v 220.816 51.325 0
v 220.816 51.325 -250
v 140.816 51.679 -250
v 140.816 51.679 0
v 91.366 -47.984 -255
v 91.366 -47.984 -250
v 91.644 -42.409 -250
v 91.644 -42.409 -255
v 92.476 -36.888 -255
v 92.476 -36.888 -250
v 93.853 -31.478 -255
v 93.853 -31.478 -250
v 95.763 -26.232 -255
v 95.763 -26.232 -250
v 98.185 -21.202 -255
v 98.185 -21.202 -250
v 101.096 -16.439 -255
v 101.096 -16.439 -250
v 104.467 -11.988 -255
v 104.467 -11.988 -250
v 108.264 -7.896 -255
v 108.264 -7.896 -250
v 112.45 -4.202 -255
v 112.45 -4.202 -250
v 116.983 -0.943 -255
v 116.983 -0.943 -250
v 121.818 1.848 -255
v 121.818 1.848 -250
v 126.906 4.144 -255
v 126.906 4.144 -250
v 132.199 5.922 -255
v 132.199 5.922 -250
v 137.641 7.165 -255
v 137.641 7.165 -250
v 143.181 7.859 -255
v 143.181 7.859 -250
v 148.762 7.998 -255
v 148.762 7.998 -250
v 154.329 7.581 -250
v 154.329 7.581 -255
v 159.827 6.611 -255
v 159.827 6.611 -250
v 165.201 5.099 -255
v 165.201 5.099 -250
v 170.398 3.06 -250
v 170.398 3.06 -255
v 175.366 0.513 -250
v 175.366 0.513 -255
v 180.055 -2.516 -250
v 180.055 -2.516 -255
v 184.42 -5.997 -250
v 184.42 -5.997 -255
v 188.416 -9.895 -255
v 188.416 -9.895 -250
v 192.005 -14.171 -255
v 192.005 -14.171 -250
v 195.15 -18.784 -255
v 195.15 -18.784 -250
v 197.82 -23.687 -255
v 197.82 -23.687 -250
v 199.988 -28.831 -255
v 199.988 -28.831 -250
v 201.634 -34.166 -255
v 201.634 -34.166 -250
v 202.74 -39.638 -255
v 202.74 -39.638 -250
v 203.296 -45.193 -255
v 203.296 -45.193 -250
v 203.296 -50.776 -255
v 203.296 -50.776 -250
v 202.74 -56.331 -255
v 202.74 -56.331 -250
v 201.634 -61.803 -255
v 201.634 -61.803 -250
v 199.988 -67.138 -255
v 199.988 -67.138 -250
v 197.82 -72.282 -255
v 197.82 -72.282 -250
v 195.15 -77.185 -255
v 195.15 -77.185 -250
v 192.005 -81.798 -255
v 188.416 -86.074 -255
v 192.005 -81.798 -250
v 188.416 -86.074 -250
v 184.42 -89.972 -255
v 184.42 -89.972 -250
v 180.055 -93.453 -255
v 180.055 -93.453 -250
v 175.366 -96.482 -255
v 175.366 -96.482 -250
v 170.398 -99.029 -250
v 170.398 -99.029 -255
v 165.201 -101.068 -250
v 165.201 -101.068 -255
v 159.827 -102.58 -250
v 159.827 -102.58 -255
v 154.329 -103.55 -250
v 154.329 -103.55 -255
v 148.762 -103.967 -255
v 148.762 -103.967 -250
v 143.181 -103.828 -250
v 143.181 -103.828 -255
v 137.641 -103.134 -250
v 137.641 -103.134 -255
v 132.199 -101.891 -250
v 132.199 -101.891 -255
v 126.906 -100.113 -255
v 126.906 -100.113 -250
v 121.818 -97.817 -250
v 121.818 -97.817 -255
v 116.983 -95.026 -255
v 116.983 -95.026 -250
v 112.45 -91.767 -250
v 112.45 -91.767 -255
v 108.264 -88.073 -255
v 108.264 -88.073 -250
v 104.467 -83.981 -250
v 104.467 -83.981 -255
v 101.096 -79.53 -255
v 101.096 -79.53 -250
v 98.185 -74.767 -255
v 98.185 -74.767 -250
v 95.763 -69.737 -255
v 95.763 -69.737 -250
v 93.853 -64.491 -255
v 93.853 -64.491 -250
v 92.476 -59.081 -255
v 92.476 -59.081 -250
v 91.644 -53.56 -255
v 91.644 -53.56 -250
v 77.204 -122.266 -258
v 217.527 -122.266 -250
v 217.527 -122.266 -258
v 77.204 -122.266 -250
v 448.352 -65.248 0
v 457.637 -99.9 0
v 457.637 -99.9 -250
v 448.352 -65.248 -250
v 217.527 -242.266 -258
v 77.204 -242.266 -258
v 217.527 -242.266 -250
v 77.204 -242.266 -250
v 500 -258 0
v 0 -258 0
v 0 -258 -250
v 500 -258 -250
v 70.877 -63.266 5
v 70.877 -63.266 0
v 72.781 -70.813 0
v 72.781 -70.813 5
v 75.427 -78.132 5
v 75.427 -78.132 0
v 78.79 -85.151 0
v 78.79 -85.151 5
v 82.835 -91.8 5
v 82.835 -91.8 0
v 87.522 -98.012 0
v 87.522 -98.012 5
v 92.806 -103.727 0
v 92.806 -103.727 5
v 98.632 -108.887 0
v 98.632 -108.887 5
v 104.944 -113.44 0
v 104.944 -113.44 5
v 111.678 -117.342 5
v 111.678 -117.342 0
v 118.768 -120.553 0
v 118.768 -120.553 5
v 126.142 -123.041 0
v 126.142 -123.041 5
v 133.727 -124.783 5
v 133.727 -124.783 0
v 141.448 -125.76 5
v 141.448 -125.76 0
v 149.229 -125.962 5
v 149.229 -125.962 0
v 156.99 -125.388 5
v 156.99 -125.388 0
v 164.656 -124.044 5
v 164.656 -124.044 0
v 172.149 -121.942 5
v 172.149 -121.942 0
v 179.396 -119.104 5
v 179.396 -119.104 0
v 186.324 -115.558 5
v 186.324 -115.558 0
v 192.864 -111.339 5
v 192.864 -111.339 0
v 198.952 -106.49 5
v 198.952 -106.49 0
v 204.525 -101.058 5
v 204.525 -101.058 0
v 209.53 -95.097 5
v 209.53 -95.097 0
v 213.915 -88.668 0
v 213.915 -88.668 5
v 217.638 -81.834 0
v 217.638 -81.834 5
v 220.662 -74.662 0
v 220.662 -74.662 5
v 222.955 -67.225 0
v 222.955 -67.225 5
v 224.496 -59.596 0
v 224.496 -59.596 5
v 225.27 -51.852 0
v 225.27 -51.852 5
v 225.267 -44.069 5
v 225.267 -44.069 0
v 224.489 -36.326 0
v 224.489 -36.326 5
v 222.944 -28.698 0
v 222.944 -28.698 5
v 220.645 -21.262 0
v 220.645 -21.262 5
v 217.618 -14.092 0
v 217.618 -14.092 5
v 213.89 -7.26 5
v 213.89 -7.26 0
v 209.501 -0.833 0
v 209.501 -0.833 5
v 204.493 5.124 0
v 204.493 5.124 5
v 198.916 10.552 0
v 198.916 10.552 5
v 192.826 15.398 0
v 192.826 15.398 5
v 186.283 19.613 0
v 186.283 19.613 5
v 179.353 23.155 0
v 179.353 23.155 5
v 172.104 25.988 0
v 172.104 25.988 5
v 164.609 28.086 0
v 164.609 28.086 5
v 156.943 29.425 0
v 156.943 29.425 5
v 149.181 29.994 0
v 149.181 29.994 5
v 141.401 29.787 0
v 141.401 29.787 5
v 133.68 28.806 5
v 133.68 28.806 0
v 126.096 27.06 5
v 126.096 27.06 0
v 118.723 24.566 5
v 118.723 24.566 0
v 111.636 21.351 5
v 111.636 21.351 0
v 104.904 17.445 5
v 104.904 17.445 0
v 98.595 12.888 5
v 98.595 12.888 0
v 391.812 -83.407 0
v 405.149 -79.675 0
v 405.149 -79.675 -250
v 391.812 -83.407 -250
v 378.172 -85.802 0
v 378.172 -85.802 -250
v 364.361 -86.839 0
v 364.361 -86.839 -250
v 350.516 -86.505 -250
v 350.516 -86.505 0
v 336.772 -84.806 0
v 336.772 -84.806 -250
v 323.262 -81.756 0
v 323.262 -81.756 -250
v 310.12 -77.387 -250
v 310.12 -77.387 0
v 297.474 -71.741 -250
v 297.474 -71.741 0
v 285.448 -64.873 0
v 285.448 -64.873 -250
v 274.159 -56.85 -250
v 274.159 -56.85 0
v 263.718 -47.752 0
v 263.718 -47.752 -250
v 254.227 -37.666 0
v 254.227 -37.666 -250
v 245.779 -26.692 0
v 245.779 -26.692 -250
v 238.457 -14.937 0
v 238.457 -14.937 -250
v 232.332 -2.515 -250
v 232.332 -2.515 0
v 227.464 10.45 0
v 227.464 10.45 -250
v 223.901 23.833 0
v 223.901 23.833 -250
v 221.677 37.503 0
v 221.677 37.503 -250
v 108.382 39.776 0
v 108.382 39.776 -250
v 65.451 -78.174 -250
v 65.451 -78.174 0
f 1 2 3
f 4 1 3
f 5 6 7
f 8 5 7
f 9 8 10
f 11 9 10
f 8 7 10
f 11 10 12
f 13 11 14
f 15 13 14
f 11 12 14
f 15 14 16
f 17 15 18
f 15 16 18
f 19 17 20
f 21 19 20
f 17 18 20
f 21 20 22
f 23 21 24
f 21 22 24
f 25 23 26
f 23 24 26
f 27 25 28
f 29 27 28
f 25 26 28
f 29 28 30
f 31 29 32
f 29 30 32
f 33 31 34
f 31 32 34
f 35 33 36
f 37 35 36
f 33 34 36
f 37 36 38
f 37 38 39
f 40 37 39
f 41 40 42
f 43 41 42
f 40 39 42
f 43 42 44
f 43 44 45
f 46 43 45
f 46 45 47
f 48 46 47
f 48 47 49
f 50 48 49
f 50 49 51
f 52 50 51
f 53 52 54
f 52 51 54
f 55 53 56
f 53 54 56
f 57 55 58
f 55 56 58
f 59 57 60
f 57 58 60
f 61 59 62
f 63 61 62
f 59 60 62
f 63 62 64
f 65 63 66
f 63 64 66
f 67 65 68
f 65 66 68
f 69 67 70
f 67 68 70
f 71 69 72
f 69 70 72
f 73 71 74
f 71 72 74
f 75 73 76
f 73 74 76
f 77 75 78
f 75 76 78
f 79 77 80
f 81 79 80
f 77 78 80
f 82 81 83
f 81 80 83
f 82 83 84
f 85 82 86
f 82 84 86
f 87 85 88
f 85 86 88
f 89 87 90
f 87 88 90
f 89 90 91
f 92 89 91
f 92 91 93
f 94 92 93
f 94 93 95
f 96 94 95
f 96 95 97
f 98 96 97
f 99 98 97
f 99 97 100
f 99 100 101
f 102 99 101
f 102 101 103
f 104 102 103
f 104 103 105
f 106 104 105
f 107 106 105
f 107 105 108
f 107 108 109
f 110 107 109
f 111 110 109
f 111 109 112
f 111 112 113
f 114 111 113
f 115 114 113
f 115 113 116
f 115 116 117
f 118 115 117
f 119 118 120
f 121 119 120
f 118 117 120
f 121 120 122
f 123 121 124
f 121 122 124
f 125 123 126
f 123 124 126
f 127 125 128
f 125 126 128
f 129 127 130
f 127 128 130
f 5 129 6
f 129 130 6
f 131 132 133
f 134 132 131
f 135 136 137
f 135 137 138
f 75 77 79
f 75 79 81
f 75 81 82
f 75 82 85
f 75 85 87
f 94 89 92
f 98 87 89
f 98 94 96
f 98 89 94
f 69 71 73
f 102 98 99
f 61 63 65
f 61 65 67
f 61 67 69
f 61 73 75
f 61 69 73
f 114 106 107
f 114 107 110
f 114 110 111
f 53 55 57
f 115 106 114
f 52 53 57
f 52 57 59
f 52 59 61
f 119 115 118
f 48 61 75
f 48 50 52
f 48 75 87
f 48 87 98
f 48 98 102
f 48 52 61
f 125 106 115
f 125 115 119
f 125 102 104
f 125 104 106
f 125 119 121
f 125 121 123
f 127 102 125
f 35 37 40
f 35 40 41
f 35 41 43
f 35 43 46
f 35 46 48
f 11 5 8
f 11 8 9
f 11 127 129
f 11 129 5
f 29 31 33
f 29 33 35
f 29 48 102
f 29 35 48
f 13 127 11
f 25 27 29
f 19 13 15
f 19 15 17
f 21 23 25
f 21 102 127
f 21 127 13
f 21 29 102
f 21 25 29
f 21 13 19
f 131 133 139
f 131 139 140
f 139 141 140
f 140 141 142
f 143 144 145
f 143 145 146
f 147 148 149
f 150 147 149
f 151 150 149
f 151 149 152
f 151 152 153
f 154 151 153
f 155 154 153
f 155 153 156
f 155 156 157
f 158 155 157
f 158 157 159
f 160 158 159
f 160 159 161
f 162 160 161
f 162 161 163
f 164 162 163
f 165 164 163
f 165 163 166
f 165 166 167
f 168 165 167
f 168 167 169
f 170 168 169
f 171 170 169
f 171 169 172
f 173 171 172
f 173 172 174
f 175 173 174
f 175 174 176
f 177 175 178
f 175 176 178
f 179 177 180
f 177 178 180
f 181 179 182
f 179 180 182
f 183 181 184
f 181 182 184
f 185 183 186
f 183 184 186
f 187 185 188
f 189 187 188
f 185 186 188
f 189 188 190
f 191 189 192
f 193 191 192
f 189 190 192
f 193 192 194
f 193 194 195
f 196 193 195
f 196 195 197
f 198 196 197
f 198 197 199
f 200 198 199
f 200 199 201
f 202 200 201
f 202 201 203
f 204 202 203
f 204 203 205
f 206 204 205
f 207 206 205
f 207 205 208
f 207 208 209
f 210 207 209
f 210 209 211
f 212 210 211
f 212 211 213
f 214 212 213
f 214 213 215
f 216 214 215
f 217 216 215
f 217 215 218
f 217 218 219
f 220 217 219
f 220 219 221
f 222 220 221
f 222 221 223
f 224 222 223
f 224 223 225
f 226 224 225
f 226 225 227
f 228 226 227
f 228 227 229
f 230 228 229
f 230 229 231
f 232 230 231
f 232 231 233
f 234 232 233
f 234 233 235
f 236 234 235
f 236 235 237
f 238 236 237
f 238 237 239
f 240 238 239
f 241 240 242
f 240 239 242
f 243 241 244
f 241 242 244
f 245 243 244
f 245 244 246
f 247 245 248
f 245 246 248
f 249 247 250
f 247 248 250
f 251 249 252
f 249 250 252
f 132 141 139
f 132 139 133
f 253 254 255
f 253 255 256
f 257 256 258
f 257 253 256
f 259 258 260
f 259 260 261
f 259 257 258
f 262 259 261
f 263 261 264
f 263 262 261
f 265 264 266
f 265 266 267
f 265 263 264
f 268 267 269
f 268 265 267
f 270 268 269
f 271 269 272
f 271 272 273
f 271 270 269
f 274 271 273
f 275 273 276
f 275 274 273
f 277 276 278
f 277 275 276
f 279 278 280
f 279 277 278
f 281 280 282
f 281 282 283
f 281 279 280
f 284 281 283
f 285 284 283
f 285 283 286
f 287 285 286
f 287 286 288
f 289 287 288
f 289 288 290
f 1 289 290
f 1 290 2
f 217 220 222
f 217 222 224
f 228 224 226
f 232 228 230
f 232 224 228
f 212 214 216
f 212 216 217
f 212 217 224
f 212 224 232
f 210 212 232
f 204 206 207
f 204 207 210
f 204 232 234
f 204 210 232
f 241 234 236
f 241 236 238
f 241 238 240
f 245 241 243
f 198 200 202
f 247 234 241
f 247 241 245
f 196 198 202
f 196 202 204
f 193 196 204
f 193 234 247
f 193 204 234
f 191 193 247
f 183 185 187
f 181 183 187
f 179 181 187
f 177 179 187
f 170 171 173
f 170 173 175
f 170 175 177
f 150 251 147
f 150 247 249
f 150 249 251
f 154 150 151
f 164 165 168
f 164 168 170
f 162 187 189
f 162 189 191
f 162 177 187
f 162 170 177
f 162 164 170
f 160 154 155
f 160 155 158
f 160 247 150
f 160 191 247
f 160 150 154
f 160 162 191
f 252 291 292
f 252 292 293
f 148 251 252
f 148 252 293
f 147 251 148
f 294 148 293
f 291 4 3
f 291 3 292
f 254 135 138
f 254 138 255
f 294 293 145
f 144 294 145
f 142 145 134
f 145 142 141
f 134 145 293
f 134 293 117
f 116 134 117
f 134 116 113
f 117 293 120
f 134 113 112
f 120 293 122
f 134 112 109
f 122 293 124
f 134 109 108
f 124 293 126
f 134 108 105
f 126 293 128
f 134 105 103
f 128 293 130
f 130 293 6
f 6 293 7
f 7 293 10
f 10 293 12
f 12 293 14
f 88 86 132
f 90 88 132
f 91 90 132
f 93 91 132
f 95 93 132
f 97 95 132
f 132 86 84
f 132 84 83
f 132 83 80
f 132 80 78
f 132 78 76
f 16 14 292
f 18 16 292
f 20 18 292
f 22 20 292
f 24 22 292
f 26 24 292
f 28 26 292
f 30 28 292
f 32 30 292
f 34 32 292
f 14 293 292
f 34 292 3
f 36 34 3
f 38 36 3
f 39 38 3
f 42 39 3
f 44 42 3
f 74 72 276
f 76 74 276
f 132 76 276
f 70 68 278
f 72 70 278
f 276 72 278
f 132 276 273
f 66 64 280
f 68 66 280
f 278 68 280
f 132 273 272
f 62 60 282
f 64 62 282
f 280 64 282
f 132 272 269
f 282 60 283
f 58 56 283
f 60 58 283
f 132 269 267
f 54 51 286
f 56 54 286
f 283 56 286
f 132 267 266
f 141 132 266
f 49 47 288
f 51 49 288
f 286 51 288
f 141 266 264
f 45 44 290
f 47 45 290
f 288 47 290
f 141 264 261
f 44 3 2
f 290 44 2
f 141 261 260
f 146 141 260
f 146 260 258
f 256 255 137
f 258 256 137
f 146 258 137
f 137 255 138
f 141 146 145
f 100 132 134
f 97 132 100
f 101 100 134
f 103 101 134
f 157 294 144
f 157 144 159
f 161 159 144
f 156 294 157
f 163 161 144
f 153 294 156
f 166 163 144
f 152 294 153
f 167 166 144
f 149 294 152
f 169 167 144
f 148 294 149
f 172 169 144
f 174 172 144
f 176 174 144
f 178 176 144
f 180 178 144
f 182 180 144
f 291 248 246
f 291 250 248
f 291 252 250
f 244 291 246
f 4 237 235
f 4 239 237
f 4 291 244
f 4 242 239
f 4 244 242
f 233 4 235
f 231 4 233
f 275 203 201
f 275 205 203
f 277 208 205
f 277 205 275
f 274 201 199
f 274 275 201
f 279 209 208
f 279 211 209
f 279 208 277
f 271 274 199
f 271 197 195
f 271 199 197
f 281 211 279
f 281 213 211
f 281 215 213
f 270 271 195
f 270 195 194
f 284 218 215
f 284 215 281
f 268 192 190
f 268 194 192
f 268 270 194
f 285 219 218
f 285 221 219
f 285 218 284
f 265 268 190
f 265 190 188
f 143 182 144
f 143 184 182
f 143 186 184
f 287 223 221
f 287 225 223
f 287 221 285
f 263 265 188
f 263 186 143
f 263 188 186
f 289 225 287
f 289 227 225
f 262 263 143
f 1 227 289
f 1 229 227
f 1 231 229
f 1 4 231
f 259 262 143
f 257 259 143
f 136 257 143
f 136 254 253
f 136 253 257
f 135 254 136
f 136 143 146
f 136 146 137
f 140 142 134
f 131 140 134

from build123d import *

# Parameters (mm, degrees)
BOSS_EXTRUDE1_DEPTH     = 250
SKETCH3_R               = 78
BOSS_EXTRUDE2_DEPTH     = 5
SKETCH4_W               = 20
SKETCH4_H               = 50
BOSS_EXTRUDE3_DEPTH     = 8
SKETCH5_R               = 56
BOSS_EXTRUDE4_DEPTH     = 5
SKETCH6_W               = 140.323042475
SKETCH6_H               = 120
BOSS_EXTRUDE5_DEPTH     = 8
CUT_EXTRUDE1_DEPTH      = 619.973343529
CUT_EXTRUDE1_DEPTH_BACK = 619.973343529
CUT_EXTRUDE2_DEPTH      = 619.973343529
CUT_EXTRUDE2_DEPTH_BACK = 619.973343529


with BuildPart() as part:
    # Sketch2 → Boss-Extrude1 (new body)
    with BuildSketch(Plane.XY):
        with BuildLine():
            Line((0, 0), (0, -258))
            Line((0, -258), (500, -258))
            Line((500, -258), (500, -48))
            Line((500, -48), (405.149093968, -79.675))
            ThreePointArc((405.149093968, -79.675), (279.704330156, -61.001338916), (220.815553876, 51.325))
            Line((220.815553876, 51.325), (140.816338804, 51.679383953))
            Line((140.816338804, 51.679383953), (0, 0))
        make_face()
    extrude(amount=-BOSS_EXTRUDE1_DEPTH)

    # Sketch3 → Boss-Extrude2 (add)
    with BuildSketch(Plane.XY):
        with Locations(Location((147.365575326, -47.984465758, 0), (0, 0, 180))):
            Circle(SKETCH3_R)
    extrude(amount=BOSS_EXTRUDE2_DEPTH)

    # Sketch4 → Boss-Extrude3 (add)
    with BuildSketch(Plane.XY):
        with Locations((33.562653109, -47.515690105)):
            Rectangle(SKETCH4_W, SKETCH4_H)
    extrude(amount=BOSS_EXTRUDE3_DEPTH)

    # Sketch5 → Boss-Extrude4 (add)
    with BuildSketch(Plane(origin=(0, 0, -250), x_dir=(-1, 0, 0), z_dir=(0, 0, -1))):
        with Locations((-147.365575326, -47.984465758)):
            Circle(SKETCH5_R)
    extrude(amount=BOSS_EXTRUDE4_DEPTH)

    # Sketch6 → Boss-Extrude5 (add)
    with BuildSketch(Plane(origin=(0, 0, -250), x_dir=(-1, 0, 0), z_dir=(0, 0, -1))):
        with Locations((-147.365575326, -182.265748938)):
            Rectangle(SKETCH6_W, SKETCH6_H)
    extrude(amount=BOSS_EXTRUDE5_DEPTH)

    # Sketch8 → Cut-Extrude1 (cut, two sides: drawn at the far end of the back side and taken through both)
    with BuildSketch(Plane(origin=(0, 0, -250), x_dir=(-1, 0, 0), z_dir=(0, 0, -1)).offset(-CUT_EXTRUDE1_DEPTH_BACK)):
        Polygon((-500, -78.40253223), (-500, -258), (-457.637340455, -99.900402235), (-448.352137529, -65.247553157), (-500, -48), align=None)
    extrude(amount=CUT_EXTRUDE1_DEPTH + CUT_EXTRUDE1_DEPTH_BACK, mode=Mode.SUBTRACT)

    # Sketch9 → Cut-Extrude2 (cut, two sides: drawn at the far end of the back side and taken through both)
    with BuildSketch(Plane(origin=(0, 0, -250), x_dir=(-1, 0, 0), z_dir=(0, 0, -1)).offset(-CUT_EXTRUDE2_DEPTH_BACK)):
        Polygon((-65.451377524, -78.173818182), (0, -258), (0, -19.248703784), (0, 0), (-108.38155171, 39.77586601), align=None)
    extrude(amount=CUT_EXTRUDE2_DEPTH + CUT_EXTRUDE2_DEPTH_BACK, mode=Mode.SUBTRACT)


solid = part.part
